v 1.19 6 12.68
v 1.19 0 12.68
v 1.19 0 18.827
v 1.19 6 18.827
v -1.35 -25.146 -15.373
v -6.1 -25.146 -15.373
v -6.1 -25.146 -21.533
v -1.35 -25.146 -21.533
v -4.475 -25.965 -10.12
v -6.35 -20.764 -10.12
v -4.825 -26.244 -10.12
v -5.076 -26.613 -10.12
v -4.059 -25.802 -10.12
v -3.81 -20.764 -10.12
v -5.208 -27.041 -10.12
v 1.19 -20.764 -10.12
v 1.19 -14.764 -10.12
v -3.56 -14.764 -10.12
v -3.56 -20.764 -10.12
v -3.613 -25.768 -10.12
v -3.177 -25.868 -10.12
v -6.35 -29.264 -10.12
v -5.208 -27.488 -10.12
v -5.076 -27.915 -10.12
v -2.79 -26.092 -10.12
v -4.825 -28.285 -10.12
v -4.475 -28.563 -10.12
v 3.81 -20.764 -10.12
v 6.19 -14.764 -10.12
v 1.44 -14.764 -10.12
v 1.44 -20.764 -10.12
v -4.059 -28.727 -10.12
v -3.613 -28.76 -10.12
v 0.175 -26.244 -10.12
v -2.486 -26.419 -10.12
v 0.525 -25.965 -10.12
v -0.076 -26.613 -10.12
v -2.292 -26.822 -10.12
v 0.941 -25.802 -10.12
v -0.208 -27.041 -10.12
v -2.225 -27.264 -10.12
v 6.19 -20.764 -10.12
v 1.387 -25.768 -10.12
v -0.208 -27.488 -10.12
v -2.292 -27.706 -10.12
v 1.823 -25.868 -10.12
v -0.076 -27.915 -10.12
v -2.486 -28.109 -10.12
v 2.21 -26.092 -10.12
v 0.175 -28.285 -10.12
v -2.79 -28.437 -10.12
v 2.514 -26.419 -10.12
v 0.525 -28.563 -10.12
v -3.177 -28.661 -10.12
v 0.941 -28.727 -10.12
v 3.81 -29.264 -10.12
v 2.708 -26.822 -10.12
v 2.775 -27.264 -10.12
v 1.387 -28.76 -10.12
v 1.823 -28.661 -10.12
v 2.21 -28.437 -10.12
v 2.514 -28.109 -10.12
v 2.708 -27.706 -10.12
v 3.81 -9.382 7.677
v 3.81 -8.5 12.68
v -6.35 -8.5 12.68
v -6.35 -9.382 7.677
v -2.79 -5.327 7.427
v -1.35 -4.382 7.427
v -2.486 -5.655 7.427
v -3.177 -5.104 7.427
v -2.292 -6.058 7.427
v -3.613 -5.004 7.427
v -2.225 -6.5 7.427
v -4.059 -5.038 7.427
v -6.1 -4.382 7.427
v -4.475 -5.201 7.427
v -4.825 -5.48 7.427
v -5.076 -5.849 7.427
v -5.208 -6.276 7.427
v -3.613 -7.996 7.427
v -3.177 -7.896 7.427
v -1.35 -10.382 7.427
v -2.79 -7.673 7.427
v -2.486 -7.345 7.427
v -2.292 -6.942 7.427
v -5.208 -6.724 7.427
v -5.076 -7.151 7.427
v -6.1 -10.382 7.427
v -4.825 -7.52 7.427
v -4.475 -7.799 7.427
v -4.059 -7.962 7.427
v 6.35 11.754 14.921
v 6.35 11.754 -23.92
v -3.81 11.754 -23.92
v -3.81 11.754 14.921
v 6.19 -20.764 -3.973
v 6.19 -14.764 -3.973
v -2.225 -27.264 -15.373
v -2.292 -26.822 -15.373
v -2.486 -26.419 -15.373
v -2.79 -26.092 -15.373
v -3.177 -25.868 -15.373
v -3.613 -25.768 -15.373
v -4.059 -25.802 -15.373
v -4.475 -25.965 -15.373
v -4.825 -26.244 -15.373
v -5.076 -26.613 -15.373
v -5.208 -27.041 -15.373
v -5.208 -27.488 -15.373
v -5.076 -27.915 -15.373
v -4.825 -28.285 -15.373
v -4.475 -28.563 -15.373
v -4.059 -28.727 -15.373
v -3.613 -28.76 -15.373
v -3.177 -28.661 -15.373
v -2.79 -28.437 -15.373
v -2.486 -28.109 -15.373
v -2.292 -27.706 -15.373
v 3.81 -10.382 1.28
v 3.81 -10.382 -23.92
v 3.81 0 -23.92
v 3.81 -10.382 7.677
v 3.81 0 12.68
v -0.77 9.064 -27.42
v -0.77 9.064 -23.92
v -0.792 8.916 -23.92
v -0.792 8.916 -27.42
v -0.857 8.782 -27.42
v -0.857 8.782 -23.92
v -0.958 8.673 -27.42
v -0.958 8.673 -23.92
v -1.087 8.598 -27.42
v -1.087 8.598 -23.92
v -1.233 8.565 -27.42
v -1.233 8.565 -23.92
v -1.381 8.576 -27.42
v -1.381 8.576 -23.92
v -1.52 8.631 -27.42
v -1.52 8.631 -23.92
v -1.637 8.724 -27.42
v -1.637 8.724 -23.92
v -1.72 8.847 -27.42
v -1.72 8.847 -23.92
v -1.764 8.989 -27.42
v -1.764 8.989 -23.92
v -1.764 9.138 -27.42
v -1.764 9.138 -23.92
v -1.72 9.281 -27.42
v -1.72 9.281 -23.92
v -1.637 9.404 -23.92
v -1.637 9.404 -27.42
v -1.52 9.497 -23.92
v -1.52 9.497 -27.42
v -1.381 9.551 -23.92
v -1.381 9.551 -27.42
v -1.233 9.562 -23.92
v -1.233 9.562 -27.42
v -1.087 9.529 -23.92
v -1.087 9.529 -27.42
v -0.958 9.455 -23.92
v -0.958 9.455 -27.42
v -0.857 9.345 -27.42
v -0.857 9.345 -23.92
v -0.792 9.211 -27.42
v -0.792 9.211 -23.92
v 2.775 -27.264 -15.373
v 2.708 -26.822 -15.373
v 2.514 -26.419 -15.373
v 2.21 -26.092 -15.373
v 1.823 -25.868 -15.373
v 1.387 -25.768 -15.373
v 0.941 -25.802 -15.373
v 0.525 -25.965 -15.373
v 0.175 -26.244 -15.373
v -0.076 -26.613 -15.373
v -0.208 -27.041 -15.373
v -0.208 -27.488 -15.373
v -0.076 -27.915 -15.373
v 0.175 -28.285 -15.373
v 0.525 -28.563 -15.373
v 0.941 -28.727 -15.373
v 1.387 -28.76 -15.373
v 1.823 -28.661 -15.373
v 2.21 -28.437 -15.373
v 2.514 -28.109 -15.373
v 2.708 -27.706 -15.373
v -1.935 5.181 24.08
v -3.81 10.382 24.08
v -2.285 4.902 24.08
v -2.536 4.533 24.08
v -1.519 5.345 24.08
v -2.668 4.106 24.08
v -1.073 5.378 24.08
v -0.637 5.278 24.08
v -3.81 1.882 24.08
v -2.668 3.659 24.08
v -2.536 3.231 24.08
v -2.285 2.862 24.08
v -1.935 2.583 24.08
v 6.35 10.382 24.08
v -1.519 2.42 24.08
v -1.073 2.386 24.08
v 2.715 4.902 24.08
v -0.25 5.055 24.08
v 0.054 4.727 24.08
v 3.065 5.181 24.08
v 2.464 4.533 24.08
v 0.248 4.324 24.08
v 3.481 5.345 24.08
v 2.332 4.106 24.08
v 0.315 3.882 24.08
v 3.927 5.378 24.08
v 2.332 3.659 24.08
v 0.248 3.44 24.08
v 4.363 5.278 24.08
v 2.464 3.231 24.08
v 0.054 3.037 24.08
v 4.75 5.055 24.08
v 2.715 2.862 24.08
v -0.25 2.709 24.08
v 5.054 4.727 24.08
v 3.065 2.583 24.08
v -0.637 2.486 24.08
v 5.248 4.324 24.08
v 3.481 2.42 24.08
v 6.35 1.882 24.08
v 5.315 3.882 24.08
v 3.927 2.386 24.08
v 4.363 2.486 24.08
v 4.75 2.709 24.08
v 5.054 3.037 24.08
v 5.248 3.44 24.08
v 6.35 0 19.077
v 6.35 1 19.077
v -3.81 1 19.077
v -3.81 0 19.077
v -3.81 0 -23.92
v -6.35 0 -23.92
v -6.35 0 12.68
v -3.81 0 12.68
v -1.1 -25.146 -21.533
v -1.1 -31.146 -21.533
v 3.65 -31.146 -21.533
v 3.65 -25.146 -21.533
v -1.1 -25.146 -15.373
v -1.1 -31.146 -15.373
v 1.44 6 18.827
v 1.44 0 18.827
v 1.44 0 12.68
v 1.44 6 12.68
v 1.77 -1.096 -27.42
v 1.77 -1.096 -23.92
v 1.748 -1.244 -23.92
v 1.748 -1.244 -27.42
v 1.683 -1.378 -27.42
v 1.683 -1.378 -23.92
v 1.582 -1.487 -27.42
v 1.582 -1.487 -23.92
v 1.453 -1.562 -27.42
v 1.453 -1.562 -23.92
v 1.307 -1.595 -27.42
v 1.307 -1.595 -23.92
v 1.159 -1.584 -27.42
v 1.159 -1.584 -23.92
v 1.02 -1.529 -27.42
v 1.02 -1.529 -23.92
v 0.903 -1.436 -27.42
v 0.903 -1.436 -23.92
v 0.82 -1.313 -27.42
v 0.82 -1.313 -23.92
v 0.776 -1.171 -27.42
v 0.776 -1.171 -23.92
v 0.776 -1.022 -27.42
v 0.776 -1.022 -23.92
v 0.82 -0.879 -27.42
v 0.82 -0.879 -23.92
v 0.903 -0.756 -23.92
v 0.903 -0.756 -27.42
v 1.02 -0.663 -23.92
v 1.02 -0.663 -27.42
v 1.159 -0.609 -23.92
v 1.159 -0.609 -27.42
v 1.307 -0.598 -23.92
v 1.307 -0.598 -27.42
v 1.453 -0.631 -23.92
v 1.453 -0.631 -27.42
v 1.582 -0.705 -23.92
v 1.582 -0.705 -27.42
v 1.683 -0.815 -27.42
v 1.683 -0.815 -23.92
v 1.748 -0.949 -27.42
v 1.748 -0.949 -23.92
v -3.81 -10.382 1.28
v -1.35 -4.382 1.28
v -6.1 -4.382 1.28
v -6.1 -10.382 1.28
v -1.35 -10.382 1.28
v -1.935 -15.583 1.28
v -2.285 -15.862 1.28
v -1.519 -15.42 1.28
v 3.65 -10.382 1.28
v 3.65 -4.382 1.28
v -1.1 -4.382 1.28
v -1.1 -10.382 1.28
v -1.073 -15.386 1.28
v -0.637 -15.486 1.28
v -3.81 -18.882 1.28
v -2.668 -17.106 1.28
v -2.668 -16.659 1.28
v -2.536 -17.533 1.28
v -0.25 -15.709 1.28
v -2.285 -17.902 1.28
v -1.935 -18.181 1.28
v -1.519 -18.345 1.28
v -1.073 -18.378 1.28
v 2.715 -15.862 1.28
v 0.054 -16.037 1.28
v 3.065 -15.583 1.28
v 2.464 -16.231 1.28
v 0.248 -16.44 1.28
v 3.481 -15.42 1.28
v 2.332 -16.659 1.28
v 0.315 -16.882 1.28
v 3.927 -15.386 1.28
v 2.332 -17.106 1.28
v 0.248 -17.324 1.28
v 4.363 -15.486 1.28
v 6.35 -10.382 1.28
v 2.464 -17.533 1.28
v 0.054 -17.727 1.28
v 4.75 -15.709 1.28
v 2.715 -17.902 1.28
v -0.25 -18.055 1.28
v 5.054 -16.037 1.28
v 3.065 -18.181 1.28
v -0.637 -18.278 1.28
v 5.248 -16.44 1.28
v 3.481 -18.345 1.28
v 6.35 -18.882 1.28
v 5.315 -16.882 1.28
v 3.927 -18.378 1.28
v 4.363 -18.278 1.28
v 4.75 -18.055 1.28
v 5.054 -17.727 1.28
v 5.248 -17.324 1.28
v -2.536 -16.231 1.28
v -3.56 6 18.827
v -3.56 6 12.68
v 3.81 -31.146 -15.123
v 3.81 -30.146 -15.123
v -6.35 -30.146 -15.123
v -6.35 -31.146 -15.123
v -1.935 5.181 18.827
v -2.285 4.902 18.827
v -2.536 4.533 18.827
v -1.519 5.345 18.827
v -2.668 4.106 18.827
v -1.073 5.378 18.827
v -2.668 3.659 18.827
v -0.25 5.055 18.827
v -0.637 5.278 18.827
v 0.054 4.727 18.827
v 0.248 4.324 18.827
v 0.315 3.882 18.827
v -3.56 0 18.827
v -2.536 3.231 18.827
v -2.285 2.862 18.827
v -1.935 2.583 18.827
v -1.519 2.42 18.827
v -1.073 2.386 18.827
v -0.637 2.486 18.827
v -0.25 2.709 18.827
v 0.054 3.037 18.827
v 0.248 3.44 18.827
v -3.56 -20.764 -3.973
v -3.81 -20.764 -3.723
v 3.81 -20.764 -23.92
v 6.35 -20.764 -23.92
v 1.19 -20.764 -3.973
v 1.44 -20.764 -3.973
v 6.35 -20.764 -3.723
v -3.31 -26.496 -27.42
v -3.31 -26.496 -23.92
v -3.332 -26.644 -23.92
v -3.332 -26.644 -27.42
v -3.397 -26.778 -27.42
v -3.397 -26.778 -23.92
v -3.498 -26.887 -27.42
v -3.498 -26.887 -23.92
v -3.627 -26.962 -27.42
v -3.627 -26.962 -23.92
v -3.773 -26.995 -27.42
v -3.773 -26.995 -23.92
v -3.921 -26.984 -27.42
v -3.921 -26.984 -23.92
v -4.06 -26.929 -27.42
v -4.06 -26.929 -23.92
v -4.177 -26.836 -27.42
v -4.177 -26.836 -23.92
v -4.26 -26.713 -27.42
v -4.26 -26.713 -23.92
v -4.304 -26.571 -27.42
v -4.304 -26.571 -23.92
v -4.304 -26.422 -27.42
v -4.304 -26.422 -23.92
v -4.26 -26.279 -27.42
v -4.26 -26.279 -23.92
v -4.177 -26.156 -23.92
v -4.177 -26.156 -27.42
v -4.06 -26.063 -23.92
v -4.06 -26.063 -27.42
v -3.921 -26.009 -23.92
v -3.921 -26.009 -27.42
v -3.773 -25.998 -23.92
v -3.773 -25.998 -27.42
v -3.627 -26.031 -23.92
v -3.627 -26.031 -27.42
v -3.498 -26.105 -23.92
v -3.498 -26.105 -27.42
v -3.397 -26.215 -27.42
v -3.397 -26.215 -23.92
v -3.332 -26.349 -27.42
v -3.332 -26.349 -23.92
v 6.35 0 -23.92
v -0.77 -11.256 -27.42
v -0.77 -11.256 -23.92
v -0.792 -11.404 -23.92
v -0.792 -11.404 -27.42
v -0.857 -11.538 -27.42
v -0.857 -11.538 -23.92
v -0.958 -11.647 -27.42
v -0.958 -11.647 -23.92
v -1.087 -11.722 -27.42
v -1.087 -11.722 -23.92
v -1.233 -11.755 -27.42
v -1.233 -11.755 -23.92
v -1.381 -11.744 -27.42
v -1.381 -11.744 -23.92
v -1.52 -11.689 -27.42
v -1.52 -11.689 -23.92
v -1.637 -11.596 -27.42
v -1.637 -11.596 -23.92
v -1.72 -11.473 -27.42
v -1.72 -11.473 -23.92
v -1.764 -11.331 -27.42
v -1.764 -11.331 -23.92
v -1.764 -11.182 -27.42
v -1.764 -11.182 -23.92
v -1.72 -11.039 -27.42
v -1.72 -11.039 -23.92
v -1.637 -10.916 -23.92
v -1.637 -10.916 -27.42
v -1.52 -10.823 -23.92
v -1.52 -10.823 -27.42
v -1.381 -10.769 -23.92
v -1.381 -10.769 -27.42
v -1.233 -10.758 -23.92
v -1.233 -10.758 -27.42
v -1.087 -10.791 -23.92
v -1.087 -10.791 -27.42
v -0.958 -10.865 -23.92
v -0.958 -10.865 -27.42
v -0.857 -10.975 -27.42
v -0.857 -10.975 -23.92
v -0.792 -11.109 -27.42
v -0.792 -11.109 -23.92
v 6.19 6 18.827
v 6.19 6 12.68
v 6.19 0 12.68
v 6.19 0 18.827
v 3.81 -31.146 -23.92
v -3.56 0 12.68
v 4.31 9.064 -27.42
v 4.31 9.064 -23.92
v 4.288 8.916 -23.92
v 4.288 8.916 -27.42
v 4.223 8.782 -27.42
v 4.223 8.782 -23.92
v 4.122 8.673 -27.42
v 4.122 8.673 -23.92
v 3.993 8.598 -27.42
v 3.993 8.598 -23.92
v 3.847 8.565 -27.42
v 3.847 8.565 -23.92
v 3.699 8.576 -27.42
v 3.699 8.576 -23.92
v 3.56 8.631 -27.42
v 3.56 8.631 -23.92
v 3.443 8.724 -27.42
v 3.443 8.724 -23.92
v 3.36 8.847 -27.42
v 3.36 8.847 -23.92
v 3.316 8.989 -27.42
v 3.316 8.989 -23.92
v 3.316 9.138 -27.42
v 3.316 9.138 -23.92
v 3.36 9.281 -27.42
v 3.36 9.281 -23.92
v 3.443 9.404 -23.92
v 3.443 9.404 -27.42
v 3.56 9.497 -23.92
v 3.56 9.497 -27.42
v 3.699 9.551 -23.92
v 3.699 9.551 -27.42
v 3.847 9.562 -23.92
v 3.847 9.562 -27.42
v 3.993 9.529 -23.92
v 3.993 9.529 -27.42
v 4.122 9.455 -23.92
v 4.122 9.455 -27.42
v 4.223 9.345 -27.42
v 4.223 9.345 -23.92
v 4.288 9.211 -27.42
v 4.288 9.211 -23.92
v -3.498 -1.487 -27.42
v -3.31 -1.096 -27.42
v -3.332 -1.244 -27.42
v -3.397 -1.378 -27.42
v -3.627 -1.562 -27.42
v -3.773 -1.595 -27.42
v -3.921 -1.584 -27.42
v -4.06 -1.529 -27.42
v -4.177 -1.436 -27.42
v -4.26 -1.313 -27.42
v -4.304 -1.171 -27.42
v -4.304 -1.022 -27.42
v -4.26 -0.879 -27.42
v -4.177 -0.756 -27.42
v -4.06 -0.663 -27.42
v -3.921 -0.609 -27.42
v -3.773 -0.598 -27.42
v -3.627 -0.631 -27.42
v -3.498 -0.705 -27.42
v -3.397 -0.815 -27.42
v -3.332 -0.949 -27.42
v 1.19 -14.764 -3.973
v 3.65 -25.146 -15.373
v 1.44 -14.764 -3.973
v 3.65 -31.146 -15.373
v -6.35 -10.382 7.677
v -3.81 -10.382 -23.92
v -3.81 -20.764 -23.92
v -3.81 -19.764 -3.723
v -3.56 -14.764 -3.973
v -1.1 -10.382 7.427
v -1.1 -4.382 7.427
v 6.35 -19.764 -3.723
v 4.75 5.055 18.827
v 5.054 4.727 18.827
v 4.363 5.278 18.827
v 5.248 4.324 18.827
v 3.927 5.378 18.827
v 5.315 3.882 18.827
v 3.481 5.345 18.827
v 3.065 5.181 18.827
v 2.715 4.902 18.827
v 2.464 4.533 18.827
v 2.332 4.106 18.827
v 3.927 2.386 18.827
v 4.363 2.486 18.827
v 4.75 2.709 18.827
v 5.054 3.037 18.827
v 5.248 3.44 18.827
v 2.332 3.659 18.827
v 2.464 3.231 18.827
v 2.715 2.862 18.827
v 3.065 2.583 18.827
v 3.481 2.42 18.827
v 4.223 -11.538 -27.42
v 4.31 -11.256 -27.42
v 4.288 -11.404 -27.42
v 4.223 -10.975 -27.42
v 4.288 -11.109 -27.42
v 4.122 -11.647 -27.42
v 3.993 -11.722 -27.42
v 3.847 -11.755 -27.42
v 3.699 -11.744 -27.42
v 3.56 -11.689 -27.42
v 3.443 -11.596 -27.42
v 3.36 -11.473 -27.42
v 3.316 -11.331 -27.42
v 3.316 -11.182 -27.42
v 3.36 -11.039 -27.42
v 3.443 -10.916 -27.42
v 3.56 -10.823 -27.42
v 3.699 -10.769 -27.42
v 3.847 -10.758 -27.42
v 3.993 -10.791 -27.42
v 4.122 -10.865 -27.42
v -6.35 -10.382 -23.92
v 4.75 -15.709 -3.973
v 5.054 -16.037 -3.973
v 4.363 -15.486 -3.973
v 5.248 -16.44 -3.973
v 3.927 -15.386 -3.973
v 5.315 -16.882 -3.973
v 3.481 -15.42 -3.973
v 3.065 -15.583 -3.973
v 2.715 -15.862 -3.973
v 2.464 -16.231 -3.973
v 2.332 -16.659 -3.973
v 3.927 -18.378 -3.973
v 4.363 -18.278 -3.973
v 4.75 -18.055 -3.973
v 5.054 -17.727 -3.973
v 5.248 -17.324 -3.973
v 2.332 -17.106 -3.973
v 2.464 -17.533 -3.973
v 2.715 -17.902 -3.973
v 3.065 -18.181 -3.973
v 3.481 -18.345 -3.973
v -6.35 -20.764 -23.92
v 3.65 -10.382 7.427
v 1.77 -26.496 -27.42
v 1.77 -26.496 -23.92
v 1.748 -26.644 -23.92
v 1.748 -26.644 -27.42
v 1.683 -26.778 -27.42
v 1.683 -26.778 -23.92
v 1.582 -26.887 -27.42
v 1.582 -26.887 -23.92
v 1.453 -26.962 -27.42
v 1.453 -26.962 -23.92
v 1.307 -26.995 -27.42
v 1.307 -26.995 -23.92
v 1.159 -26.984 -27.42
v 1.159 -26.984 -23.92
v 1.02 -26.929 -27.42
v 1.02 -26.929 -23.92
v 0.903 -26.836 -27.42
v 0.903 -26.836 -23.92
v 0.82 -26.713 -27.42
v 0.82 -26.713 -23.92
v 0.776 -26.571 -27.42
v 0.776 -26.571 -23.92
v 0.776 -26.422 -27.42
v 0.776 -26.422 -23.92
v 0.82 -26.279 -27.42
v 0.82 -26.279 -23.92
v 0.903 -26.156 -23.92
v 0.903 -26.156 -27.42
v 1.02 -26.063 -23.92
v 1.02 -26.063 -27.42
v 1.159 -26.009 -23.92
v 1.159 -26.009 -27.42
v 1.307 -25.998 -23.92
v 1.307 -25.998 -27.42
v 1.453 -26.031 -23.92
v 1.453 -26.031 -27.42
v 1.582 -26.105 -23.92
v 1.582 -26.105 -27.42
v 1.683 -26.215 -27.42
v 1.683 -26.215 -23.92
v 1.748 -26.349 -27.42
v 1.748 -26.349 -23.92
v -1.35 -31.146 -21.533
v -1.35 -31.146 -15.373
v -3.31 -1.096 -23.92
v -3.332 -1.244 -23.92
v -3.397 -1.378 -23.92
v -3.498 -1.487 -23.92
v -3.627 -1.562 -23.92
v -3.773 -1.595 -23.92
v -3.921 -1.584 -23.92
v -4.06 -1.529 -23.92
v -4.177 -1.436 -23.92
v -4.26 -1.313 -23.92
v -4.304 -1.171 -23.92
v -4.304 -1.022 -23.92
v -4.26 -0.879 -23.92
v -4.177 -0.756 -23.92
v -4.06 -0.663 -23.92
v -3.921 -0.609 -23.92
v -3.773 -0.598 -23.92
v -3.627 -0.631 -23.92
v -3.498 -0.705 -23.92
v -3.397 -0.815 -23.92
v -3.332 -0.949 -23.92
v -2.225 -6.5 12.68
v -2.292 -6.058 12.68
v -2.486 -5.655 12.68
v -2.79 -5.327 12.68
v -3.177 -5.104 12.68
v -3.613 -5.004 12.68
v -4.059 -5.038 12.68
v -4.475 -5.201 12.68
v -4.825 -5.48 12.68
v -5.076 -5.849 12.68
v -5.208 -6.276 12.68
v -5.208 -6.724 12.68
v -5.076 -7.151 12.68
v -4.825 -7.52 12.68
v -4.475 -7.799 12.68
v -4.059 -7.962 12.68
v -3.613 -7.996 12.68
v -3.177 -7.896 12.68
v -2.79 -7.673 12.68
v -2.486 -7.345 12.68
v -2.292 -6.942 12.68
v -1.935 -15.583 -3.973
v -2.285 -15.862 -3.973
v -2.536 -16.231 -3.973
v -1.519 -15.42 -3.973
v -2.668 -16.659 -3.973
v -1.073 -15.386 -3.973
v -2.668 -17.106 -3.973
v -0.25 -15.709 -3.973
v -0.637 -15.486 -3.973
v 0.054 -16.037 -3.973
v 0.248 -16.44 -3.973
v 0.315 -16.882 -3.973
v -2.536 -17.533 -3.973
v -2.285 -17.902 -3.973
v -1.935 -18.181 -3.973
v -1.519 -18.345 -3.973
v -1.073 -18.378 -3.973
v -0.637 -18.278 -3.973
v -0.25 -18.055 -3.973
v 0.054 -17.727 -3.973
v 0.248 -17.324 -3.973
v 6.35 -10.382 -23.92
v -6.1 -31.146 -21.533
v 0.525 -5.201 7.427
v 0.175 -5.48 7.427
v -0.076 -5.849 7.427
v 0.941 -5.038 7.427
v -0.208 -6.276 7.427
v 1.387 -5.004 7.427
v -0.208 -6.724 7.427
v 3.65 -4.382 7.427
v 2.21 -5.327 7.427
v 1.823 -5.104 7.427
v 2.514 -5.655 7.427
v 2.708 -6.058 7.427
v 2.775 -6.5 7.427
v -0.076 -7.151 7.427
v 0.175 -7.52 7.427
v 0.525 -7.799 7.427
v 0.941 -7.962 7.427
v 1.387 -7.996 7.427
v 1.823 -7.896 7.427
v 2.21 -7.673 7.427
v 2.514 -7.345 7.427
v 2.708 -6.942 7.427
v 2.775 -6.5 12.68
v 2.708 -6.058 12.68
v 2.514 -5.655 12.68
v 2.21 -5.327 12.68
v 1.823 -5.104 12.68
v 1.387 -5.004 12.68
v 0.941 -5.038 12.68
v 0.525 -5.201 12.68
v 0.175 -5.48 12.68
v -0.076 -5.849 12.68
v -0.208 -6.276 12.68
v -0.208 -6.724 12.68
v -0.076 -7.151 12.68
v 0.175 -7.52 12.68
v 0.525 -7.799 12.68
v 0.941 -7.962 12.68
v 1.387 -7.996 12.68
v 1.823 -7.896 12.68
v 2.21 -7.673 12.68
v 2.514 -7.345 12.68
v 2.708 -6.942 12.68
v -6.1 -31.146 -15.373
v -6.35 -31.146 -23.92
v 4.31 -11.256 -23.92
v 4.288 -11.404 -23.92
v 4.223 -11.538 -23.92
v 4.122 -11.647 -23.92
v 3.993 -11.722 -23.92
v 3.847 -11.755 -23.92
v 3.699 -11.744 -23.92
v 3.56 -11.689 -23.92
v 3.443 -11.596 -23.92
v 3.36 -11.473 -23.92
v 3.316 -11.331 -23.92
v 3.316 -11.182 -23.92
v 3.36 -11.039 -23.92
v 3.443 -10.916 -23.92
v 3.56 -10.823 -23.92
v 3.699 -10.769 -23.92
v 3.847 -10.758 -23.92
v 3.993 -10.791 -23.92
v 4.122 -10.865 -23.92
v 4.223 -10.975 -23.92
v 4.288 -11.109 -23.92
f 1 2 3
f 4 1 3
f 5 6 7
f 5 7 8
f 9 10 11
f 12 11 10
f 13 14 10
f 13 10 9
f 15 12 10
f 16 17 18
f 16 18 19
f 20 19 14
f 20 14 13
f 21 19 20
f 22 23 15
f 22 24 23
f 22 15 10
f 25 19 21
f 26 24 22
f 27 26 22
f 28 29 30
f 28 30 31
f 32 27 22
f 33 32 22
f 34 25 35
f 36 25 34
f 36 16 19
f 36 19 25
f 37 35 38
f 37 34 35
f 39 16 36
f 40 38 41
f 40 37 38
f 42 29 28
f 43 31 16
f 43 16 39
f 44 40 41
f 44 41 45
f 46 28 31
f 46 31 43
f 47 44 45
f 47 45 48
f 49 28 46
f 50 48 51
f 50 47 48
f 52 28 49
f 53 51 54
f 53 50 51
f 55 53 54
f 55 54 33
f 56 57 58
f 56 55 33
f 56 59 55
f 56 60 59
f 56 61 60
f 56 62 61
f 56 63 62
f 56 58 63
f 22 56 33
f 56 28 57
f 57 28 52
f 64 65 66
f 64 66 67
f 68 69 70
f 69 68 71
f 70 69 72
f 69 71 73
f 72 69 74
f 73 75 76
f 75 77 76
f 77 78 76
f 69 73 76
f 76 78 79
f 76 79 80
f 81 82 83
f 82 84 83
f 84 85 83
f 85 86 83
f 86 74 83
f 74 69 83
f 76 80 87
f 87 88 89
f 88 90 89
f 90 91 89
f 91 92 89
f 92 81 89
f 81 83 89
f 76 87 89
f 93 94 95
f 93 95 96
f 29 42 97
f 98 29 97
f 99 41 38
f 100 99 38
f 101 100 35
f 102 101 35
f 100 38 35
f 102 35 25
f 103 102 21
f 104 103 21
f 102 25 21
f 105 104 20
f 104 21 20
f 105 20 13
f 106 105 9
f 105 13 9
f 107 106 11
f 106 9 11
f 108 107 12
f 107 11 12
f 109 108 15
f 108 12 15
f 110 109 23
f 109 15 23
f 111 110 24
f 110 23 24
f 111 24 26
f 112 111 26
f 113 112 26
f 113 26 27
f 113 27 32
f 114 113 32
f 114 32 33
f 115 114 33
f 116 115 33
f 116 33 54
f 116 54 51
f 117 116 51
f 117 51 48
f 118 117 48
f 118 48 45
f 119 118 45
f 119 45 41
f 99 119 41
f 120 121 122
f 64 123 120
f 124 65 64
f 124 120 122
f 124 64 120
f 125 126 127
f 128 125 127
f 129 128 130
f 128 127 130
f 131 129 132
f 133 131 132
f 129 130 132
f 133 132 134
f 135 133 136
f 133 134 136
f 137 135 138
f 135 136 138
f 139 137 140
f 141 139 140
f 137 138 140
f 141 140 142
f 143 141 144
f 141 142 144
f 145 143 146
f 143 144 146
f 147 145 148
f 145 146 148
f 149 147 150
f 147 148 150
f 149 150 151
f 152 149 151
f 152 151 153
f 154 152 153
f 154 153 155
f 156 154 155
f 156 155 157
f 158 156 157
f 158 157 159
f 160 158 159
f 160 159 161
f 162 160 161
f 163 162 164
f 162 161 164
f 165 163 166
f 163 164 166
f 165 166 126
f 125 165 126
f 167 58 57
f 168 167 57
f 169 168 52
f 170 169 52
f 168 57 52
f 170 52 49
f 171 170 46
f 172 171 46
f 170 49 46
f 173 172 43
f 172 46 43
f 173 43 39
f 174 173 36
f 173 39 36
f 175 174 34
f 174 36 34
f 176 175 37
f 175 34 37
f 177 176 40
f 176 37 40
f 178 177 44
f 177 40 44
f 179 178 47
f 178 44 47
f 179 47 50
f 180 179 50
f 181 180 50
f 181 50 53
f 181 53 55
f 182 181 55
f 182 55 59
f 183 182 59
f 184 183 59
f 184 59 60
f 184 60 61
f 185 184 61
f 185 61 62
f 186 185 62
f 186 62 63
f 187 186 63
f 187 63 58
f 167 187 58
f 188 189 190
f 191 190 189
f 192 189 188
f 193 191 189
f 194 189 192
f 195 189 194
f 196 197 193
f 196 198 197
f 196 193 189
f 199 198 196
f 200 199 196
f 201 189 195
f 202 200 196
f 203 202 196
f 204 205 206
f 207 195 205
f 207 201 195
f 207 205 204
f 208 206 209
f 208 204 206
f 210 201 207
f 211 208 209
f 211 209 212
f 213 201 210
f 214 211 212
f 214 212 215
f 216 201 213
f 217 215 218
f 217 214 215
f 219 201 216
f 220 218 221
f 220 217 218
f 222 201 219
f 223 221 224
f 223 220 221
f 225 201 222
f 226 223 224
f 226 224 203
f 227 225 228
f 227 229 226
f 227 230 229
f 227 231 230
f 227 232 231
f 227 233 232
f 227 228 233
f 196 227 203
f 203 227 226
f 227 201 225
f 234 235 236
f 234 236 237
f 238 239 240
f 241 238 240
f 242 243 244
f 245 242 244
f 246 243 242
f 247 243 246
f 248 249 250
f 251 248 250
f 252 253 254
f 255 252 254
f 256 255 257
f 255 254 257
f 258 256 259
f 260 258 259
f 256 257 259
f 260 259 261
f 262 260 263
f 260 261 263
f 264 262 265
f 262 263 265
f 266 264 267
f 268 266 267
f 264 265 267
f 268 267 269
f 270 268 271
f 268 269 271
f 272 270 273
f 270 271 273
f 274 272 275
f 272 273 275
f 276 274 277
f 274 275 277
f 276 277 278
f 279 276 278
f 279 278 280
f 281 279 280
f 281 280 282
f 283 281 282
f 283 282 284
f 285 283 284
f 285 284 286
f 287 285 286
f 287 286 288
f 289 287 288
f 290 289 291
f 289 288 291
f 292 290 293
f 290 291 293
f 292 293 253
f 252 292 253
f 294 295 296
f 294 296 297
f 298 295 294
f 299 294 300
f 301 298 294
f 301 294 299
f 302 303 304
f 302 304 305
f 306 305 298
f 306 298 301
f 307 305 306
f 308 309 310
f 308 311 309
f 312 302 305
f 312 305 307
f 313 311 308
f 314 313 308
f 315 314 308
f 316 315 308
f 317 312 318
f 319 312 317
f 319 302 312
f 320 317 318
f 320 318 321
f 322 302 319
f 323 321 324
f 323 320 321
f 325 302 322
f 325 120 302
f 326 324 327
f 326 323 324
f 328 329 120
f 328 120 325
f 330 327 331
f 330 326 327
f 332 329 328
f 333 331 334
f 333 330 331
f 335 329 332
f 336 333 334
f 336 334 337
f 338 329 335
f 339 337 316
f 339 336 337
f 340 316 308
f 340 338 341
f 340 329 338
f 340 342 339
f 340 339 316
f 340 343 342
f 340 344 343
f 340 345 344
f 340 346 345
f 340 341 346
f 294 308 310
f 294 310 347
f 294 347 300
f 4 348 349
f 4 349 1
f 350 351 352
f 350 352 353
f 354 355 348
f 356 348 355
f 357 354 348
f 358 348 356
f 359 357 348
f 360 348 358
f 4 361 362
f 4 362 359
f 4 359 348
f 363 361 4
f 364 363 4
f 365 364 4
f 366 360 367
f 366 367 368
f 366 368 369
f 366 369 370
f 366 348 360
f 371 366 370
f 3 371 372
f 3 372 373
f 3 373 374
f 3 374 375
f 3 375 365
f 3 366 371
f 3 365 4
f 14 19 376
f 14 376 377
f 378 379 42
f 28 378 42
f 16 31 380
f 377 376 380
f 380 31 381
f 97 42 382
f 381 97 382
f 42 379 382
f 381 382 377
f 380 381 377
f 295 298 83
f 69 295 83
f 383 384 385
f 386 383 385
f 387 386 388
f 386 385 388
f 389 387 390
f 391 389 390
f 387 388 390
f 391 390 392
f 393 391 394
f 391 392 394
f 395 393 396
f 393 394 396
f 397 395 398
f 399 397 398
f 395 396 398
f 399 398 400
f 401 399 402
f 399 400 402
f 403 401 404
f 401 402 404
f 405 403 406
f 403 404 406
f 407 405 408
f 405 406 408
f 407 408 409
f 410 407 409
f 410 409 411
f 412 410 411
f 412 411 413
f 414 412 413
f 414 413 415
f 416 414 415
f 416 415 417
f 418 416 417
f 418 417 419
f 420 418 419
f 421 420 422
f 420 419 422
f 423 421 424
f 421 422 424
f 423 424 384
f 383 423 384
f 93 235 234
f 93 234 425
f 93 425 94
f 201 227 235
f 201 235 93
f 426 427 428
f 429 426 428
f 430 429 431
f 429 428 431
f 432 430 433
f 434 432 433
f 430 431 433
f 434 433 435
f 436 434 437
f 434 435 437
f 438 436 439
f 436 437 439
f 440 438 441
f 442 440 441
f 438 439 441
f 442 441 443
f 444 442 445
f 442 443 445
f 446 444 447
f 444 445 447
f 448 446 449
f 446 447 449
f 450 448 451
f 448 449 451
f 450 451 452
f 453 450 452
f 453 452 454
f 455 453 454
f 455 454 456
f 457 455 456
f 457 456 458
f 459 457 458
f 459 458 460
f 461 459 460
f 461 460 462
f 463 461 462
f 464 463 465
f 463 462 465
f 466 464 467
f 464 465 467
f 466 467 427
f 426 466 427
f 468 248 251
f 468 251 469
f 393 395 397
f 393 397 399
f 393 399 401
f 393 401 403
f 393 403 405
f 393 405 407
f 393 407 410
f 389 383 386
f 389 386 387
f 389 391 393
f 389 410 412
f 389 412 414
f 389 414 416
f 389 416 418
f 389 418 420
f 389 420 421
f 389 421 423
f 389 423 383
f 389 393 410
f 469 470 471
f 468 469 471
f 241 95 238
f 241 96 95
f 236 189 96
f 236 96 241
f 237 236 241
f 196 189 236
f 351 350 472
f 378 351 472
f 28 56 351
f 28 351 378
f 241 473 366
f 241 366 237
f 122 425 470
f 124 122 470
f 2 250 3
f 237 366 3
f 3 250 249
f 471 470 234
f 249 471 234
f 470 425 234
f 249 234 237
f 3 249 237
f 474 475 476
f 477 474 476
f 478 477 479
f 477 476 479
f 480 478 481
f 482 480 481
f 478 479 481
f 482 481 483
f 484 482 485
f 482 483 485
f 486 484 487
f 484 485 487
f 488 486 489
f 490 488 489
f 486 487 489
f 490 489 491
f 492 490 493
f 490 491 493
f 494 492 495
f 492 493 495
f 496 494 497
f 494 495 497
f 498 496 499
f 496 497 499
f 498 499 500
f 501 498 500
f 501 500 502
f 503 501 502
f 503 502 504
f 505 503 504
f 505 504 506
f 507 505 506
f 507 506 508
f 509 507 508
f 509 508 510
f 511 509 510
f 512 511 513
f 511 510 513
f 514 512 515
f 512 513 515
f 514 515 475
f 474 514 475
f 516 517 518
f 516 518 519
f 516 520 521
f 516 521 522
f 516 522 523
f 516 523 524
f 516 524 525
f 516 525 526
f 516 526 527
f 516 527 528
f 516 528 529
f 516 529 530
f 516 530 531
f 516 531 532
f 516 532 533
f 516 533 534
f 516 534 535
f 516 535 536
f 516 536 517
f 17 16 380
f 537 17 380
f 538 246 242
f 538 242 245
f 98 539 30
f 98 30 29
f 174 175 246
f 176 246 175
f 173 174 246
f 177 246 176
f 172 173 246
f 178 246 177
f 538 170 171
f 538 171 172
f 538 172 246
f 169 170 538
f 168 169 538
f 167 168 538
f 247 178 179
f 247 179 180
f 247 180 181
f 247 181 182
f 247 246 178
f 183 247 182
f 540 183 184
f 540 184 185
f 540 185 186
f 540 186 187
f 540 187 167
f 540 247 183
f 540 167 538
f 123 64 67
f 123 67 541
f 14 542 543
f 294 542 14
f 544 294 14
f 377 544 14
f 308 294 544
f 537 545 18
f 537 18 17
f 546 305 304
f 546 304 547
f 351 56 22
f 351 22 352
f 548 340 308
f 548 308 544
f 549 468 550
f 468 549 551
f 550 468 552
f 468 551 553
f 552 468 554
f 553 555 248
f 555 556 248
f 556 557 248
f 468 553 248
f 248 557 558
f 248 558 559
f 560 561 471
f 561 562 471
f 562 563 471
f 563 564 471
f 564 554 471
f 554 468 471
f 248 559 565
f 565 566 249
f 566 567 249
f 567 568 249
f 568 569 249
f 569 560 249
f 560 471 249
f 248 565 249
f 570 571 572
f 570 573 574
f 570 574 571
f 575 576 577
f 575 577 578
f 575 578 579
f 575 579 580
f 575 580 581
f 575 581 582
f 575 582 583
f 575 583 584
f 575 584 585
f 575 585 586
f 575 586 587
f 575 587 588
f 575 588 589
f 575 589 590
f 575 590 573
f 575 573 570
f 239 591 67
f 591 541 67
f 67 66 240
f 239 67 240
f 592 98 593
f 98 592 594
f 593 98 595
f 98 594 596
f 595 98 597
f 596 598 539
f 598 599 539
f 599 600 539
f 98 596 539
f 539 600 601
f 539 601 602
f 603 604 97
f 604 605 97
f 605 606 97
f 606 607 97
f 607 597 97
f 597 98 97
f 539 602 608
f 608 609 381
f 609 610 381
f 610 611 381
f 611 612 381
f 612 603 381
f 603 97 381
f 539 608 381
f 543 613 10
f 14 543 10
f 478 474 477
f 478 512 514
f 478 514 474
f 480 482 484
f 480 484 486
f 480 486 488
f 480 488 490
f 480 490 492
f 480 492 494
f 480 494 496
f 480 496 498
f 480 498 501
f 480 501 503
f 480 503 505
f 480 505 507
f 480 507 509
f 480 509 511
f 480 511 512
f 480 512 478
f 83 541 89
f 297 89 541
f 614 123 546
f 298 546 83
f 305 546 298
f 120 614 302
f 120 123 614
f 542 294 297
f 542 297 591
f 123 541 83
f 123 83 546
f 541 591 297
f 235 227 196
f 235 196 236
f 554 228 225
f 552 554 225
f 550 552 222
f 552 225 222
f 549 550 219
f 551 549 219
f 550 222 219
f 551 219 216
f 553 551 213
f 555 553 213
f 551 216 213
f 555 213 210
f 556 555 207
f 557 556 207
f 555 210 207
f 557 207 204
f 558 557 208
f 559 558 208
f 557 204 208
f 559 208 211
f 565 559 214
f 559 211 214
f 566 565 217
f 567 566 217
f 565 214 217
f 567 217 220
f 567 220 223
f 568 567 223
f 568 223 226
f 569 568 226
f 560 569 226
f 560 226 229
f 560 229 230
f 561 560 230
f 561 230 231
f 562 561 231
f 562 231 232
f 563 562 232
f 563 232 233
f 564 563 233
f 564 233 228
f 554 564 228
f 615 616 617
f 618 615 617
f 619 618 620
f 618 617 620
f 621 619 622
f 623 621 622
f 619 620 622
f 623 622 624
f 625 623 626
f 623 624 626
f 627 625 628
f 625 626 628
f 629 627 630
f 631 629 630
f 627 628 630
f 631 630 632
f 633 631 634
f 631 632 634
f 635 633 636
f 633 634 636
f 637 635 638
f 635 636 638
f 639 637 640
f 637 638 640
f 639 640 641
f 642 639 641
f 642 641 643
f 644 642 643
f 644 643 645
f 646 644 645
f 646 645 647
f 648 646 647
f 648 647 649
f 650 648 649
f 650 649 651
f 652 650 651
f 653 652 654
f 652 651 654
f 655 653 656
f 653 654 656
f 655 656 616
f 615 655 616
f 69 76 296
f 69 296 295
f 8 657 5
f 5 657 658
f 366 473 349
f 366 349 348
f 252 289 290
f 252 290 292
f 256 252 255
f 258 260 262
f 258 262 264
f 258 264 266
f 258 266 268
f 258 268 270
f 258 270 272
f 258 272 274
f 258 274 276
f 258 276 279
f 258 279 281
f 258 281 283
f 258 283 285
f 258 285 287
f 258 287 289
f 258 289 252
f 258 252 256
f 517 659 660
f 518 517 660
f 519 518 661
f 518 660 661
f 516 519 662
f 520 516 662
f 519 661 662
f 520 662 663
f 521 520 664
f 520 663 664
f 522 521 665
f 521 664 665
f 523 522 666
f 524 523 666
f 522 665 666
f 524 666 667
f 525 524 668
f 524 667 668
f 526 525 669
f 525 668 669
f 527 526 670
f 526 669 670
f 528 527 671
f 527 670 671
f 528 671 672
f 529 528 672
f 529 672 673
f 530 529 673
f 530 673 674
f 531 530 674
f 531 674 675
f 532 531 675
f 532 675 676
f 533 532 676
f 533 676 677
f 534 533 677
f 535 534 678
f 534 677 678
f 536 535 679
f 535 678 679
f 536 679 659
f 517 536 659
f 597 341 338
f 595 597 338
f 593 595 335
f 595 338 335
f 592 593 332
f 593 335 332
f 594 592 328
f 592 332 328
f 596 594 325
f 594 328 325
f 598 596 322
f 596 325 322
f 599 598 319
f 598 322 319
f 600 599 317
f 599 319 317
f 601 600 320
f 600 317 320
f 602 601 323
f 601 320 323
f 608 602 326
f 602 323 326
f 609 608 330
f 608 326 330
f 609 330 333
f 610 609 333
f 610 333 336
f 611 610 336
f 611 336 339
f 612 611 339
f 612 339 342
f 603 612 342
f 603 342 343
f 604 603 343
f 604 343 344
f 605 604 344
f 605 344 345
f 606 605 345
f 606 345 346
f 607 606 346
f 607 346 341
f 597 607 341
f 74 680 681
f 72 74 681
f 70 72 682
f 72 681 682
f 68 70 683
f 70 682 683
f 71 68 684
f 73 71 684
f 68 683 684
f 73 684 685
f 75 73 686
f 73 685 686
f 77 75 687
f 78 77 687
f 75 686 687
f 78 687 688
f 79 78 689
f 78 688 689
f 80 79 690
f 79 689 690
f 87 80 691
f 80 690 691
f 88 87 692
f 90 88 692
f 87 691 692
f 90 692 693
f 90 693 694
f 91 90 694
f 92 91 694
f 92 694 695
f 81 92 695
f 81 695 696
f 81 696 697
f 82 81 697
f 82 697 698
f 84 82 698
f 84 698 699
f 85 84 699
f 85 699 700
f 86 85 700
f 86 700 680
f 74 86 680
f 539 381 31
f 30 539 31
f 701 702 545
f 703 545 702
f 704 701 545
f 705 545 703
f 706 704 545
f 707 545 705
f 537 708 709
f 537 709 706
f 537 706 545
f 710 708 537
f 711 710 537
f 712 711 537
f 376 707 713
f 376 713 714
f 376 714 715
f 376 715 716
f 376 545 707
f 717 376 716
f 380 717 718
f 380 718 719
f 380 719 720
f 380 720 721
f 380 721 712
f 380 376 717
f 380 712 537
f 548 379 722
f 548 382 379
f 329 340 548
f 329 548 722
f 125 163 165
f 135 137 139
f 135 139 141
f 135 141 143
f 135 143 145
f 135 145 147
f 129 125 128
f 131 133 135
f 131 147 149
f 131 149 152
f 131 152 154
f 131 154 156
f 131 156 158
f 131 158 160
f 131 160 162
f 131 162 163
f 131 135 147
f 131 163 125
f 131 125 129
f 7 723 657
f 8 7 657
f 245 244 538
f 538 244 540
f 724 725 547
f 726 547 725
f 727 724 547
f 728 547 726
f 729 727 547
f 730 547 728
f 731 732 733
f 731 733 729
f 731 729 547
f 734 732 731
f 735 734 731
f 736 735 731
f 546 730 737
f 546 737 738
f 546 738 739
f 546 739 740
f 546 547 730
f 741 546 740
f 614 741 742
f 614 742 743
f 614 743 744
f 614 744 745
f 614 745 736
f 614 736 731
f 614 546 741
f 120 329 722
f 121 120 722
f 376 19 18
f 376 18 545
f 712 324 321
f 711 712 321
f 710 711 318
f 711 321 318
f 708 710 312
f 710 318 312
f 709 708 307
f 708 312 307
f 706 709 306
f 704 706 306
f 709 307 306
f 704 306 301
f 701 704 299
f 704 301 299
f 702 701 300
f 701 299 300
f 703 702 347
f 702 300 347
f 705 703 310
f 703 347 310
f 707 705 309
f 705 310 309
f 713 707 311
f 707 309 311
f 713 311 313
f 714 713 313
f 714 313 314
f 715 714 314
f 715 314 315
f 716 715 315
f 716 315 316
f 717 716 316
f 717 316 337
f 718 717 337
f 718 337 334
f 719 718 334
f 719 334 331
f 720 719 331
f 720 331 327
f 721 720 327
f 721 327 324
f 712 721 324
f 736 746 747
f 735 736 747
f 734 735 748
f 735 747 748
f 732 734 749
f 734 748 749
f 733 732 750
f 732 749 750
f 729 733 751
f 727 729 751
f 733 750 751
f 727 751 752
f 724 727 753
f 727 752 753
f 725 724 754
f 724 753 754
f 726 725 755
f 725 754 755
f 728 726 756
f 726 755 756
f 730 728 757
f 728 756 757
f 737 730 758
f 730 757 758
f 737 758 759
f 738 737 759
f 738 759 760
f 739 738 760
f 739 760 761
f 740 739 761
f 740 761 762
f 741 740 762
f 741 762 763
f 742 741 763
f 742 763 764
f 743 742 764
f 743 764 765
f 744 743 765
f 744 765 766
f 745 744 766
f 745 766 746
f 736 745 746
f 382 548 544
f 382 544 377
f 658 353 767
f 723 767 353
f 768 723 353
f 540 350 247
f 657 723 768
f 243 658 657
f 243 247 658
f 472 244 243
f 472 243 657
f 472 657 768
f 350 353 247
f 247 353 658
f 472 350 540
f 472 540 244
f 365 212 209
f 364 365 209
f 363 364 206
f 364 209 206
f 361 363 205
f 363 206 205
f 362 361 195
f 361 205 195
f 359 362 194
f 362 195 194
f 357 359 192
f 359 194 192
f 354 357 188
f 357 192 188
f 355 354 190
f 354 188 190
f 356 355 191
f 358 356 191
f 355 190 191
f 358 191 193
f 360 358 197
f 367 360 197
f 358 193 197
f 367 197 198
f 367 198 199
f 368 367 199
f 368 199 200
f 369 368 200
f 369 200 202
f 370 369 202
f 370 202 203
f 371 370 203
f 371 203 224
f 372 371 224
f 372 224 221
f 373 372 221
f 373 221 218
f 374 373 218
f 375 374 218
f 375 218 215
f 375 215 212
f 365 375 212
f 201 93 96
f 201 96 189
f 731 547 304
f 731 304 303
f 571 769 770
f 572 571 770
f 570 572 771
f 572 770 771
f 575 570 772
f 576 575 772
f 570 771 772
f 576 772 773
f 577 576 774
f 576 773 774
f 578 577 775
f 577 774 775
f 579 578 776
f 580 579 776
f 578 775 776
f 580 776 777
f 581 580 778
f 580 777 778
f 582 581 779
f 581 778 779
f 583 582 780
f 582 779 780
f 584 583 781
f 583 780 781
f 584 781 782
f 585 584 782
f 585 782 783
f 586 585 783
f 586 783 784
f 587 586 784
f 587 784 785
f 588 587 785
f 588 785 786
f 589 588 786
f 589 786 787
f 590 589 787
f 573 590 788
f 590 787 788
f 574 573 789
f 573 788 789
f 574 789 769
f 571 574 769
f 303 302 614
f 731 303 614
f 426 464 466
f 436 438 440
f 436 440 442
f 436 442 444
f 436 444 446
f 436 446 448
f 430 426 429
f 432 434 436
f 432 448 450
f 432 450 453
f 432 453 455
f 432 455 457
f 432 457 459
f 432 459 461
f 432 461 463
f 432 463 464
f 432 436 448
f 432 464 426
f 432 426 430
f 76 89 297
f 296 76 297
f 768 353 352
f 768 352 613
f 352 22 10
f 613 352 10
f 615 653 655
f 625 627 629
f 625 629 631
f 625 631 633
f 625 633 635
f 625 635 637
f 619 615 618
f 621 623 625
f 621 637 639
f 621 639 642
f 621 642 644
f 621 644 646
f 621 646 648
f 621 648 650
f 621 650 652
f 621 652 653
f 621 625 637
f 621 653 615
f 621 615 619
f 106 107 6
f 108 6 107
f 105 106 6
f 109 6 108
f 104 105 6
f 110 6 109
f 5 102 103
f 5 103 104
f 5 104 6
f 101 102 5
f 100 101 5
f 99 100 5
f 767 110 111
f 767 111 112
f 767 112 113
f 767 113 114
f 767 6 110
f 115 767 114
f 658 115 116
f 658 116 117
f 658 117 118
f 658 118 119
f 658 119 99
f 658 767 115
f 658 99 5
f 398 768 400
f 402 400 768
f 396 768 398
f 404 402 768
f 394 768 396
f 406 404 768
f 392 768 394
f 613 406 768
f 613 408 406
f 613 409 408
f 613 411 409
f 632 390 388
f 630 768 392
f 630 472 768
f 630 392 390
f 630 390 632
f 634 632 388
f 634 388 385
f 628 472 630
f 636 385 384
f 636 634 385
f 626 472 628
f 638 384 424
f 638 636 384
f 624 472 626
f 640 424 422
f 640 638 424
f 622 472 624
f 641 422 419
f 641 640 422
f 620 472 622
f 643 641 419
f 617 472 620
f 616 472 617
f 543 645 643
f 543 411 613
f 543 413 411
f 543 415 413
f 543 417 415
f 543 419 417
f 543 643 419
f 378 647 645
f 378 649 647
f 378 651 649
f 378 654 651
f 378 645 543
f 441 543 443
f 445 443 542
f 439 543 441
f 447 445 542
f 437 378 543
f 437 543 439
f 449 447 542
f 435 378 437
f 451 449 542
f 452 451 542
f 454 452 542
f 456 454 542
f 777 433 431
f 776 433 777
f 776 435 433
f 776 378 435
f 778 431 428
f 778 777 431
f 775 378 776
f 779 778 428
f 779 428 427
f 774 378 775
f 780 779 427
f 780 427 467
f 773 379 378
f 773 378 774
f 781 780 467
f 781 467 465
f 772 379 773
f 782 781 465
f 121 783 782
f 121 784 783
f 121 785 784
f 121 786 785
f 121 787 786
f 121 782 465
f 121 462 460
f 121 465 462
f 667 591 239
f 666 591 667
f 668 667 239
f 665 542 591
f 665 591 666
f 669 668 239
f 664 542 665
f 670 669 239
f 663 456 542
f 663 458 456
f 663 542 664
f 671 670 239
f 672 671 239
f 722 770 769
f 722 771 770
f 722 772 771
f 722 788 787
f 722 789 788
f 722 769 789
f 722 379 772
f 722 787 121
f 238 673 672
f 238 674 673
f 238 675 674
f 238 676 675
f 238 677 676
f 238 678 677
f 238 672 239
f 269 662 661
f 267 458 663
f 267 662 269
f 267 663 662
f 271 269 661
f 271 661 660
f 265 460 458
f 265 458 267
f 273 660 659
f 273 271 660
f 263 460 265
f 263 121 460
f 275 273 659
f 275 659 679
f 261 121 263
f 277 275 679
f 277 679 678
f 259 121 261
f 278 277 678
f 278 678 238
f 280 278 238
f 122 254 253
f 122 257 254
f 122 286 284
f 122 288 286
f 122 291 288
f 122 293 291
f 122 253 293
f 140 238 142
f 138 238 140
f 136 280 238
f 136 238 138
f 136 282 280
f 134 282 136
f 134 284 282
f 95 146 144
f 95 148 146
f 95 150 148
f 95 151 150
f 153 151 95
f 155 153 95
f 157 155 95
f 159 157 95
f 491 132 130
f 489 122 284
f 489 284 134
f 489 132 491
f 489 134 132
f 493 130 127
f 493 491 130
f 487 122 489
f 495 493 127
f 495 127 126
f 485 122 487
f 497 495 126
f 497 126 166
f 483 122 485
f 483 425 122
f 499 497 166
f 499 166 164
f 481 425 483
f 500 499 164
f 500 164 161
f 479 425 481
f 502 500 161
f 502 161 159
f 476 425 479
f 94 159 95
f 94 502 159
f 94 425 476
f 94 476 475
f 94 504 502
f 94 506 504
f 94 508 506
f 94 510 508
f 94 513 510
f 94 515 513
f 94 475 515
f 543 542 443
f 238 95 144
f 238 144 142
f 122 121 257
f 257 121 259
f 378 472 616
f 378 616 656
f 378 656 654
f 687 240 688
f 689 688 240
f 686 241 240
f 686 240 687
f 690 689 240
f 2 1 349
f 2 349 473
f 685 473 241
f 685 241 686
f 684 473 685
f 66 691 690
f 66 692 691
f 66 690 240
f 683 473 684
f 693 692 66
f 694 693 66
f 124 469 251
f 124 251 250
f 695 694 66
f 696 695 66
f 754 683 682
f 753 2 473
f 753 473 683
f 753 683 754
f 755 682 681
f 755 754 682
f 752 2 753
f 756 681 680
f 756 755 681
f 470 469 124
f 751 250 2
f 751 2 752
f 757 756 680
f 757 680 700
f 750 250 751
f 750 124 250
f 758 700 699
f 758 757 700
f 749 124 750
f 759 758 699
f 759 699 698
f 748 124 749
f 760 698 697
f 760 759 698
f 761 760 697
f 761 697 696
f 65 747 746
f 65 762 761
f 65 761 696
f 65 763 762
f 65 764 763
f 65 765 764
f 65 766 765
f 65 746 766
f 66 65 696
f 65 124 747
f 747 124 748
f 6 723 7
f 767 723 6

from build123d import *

# Parameters (mm, degrees)
F1_DEPTH  = 6.35
F3_DEPTH  = 2.54
F5_DEPTH  = 2.54
F6_W      = 4.75
F6_H      = 6.1595766147
F8_W      = 4.75
F8_H      = 6.1471766147
F7_W      = 4.75
F7_H      = 6.1471766147
F9_W      = 4.75
F9_H      = 6.1471766147
F10_DEPTH = 6
F11_R     = 1.5
F12_R     = 1.5
F13_R     = 1.5
F14_R     = 1.5
F15_DEPTH = 6
F16_R     = 0.5
F17_DEPTH = 3.5


# Not quite as in the source:
# - a feature names something its author has since deleted; it is built from what else it names


with BuildPart() as f1:
    # F0 (on Right) → F1 (new body, symmetric)
    with BuildSketch(Plane.YZ):
        Polygon((10.3821327425, 24.0797383321), (1.8821327425, 24.0797383321), (1, 19.0769149468), (0, 19.0769149468), (0, 12.6797383321), (-8.5, 12.6797383321), (-9.3821327425, 7.6769149468), (-10.3821327425, 7.6769149468), (-10.3821327425, 1.2797383321), (-18.8821327425, 1.2797383321), (-19.7642654851, -3.7230850532), (-20.7642654851, -3.7230850532), (-20.7642654851, -10.1202616679), (-29.2642654851, -10.1202616679), (-30.1463982276, -15.1230850532), (-31.1463982276, -15.1230850532), (-31.1463982276, -23.9202616679), (11.7536017724, -23.9202616679), (11.7536017724, 14.9208800867), align=None)
    extrude(amount=F1_DEPTH, both=True)

    # F2 (on face) → F3 (cut)
    with BuildSketch(Plane(origin=(-6.35, 0, 0), x_dir=(0, -1, 0), z_dir=(-1, 0, 0))):
        Polygon((-11.7536017724, -23.9202616679), (0, -23.9202616679), (0, 12.6797383321), (0, 19.0769149468), (-1, 19.0769149468), (-1.8821327425, 24.0797383321), (-10.3821327425, 24.0797383321), (-11.7536017724, 14.9208800867), align=None)
        Polygon((20.7642654851, -23.9202616679), (20.7642654851, -10.1202616679), (20.7642654851, -3.7230850532), (19.7642654851, -3.7230850532), (18.8821327425, 1.2797383321), (10.3821327425, 1.2797383321), (10.3821327425, -23.9202616679), align=None)
    extrude(amount=-F3_DEPTH, mode=Mode.SUBTRACT)

    # F4 (on face) → F5 (cut)
    with BuildSketch(Plane.YZ.offset(6.35)):
        Polygon((-20.7642654851, -23.9202616679), (-20.7642654851, -10.1202616679), (-29.2642654851, -10.1202616679), (-30.1463982276, -15.1230850532), (-31.1463982276, -15.1230850532), (-31.1463982276, -23.9202616679), align=None)
        Polygon((-10.3821327425, 1.2797383321), (-10.3821327425, -23.9202616679), (0, -23.9202616679), (0, 12.6797383321), (-8.5, 12.6797383321), (-9.3821327425, 7.6769149468), (-10.3821327425, 7.6769149468), align=None)
    extrude(amount=-F5_DEPTH, mode=Mode.SUBTRACT)

    # F6 (on face) + F8 (on face) + F7 (on face) + F9 (on face) → F10 (cut)
    with BuildSketch(Plane.XZ.offset(31.1463982276)):
        with Locations((-3.725, -18.4528733606)):
            Rectangle(F6_W, F6_H)
        with Locations((1.275, -18.4528733606)):
            Rectangle(F6_W, F6_H)
        with Locations((6.275, -18.4528733606)):
            Rectangle(F6_W, F6_H)
    with BuildSketch(Plane.XZ.offset(10.3821327425)):
        Polygon((-6.1, 7.4269149468), (-6.1, 1.2797383321), (-3.81, 1.2797383321), (-1.35, 1.2797383321), (-1.35, 7.4269149468), align=None)
        with Locations((1.275, 4.3533266394)):
            Rectangle(F8_W, F8_H)
        with Locations((6.275, 4.3533266394)):
            Rectangle(F8_W, F8_H)
    with BuildSketch(Plane.XZ.offset(20.7642654851)):
        with Locations((-1.185, -7.0466733606)):
            Rectangle(F7_W, F7_H)
        Polygon((1.44, -3.9730850532), (1.44, -10.1202616679), (3.81, -10.1202616679), (6.19, -10.1202616679), (6.19, -3.9730850532), align=None)
        with Locations((8.815, -7.0466733606)):
            Rectangle(F7_W, F7_H)
    with BuildSketch(Plane.XZ):
        with Locations((-1.185, 15.7533266394)):
            Rectangle(F9_W, F9_H)
        Polygon((1.44, 18.8269149468), (1.44, 12.6797383321), (3.81, 12.6797383321), (6.19, 12.6797383321), (6.19, 18.8269149468), align=None)
        with Locations((8.815, 15.7533266394)):
            Rectangle(F9_W, F9_H)
    extrude(amount=-F10_DEPTH, mode=Mode.SUBTRACT)

    # F11 (on face) + F12 (on face) + F13 (on face) + F14 (on face) → F15 (cut)
    with BuildSketch(Plane.XY.offset(-10.1202616679)):
        with Locations((-3.725, -27.2642654851)):
            Circle(F11_R)
        with Locations((1.275, -27.2642654851)):
            Circle(F11_R)
        with Locations((6.275, -27.2642654851)):
            Circle(F11_R)
    with BuildSketch(Plane.XY.offset(1.2797383321)):
        with Locations((-1.185, -16.8821327425)):
            Circle(F12_R)
        with Locations((3.815, -16.8821327425)):
            Circle(F12_R)
        with Locations((8.815, -16.8821327425)):
            Circle(F12_R)
    with BuildSketch(Plane.XY.offset(12.6797383321)):
        with Locations((-3.725, -6.5)):
            Circle(F13_R)
        with Locations((1.275, -6.5)):
            Circle(F13_R)
        with Locations((6.275, -6.5)):
            Circle(F13_R)
    with BuildSketch(Plane.XY.offset(24.0797383321)):
        with Locations((-1.185, 3.8821327425)):
            Circle(F14_R)
        with Locations((3.815, 3.8821327425)):
            Circle(F14_R)
        with Locations((8.815, 3.8821327425)):
            Circle(F14_R)
    extrude(amount=-F15_DEPTH, mode=Mode.SUBTRACT)

    # F16 (on face) → F17 (join)
    with BuildSketch(Plane(origin=(0, 0, -23.9202616679), x_dir=(1, 0, 0), z_dir=(0, 0, -1))):
        with Locations((1.27, 26.4963982276)):
            Circle(F16_R)
        with Locations((-3.81, 26.4963982276)):
            Circle(F16_R)
        with Locations((3.81, 11.2563982276)):
            Circle(F16_R)
        with Locations((-1.27, 11.2563982276)):
            Circle(F16_R)
        with Locations((-3.81, 1.0963982276)):
            Circle(F16_R)
        with Locations((1.27, 1.0963982276)):
            Circle(F16_R)
        with Locations((3.81, -9.0636017724)):
            Circle(F16_R)
        with Locations((-1.27, -9.0636017724)):
            Circle(F16_R)
    extrude(amount=F17_DEPTH)


solid = f1.part
